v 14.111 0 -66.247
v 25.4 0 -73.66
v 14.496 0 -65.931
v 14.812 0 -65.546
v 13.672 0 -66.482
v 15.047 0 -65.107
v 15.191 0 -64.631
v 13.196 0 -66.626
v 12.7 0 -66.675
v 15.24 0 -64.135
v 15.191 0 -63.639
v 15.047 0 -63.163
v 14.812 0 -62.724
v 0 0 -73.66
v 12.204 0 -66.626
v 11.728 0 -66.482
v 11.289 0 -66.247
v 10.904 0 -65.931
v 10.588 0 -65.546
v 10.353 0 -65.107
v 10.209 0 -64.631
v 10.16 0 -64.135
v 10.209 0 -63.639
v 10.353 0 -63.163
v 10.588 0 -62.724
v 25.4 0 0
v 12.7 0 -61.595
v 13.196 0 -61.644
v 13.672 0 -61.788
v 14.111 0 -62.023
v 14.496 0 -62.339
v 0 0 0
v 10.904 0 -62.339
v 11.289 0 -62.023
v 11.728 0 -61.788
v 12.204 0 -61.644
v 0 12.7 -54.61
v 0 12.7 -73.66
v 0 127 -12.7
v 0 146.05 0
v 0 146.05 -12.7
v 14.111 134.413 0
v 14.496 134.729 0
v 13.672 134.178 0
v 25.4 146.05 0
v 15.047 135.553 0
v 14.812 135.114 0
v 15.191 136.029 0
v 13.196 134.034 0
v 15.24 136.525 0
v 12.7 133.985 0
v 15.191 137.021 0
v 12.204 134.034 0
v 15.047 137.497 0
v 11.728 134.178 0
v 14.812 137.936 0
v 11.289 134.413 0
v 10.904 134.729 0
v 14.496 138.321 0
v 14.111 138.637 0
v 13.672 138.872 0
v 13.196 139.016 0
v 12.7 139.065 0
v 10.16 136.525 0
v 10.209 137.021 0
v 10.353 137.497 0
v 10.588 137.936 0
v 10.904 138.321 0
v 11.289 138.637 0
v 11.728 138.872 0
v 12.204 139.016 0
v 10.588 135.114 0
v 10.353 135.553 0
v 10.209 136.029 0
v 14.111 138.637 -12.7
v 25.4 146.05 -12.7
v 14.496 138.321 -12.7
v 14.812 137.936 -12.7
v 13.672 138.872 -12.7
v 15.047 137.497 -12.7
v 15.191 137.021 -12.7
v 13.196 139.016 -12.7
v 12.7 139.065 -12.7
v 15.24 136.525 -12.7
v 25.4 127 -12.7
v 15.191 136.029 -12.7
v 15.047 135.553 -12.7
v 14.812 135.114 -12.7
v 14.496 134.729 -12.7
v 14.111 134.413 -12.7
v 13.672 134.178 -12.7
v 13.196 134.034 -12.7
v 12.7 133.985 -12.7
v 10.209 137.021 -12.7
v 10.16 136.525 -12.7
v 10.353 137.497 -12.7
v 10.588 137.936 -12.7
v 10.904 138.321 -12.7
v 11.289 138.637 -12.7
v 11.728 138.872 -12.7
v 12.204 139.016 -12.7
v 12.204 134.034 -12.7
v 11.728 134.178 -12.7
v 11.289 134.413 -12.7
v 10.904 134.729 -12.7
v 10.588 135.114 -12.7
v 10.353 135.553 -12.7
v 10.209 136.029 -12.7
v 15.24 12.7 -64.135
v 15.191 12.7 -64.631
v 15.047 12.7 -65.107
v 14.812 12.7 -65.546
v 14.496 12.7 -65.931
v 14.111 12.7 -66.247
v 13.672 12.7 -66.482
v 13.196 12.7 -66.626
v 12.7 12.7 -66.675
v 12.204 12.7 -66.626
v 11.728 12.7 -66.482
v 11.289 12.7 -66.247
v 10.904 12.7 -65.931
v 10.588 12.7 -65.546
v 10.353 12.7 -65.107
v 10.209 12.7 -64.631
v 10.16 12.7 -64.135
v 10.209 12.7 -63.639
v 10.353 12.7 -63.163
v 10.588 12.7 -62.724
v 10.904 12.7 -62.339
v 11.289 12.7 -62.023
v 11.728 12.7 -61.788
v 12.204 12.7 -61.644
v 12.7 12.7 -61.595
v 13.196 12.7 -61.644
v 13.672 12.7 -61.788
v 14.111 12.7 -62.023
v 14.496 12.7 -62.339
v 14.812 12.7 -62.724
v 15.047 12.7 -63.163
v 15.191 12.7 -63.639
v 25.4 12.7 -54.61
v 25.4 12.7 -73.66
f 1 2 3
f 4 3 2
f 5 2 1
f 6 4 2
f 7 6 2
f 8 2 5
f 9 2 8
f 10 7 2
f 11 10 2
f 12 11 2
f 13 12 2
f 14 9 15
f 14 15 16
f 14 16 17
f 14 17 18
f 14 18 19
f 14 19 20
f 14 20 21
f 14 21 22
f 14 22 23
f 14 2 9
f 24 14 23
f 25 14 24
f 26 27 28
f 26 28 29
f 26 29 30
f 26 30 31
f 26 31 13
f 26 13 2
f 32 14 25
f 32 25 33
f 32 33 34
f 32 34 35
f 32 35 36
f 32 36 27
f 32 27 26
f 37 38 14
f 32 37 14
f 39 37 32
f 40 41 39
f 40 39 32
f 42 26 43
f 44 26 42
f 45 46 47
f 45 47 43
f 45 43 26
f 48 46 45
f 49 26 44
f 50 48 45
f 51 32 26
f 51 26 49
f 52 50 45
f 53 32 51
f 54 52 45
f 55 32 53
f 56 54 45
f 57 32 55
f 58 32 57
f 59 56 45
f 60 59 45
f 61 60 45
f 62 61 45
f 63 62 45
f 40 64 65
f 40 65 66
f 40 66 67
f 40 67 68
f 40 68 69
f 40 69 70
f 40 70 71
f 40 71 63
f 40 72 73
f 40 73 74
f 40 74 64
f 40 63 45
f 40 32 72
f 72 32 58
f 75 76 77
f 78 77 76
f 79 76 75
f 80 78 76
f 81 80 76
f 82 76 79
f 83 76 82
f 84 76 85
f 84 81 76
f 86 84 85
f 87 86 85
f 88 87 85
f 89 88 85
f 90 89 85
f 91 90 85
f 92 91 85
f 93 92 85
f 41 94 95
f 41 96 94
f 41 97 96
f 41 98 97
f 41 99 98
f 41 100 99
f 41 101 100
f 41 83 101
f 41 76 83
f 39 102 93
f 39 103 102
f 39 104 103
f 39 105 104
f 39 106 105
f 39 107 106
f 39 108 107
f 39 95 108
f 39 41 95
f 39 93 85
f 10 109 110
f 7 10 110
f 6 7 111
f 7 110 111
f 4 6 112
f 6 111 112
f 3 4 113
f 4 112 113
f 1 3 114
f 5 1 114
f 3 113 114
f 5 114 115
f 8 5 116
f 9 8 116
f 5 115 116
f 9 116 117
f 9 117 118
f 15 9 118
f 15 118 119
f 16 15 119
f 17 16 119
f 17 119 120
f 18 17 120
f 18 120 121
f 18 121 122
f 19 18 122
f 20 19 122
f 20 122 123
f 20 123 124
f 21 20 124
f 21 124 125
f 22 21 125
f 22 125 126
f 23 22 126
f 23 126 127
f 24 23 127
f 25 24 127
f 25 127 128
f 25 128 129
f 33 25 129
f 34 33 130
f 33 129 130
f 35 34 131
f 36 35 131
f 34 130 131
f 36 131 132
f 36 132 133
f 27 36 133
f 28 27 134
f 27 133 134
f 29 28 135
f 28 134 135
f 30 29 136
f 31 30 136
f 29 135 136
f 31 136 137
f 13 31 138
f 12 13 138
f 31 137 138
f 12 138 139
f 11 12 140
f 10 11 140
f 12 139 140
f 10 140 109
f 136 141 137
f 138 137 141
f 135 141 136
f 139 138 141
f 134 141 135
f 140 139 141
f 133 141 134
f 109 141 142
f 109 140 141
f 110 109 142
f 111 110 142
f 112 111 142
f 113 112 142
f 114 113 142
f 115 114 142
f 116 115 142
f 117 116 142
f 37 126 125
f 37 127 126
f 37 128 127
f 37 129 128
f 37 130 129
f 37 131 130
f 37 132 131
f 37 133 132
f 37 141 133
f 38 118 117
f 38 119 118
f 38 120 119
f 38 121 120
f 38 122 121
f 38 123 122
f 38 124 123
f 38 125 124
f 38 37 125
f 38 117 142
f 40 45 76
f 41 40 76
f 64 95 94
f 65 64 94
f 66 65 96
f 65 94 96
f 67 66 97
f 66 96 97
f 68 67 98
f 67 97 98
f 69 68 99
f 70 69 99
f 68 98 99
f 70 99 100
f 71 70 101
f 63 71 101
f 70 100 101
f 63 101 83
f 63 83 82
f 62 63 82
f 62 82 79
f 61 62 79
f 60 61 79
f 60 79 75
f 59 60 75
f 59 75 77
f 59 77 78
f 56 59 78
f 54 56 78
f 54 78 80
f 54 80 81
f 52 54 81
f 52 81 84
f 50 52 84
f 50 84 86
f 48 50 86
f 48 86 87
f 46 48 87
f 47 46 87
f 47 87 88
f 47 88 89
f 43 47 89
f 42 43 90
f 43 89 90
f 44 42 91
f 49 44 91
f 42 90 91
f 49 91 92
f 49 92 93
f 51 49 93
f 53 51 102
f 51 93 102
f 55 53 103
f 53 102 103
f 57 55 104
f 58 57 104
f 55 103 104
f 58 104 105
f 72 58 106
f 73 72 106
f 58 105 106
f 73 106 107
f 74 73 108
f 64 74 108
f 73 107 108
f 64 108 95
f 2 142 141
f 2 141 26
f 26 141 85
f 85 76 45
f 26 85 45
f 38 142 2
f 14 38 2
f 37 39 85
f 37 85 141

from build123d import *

# Parameters (mm, degrees)
BOSS_EXTRUDE1_DEPTH = 25.4
SKETCH2_R           = 2.54
CUT_EXTRUDE1_DEPTH  = 13.7
SKETCH3_R           = 2.54
CUT_EXTRUDE2_DEPTH  = 13.7


with BuildPart() as part:
    # Sketch1 → Boss-Extrude1 (new body)
    with BuildSketch(Plane(origin=(0, 0, 0), x_dir=(0, 0, -1), z_dir=(1, 0, 0))):
        Polygon((0, 0), (0, 146.05), (12.7, 146.05), (12.7, 127), (54.61, 12.7), (73.66, 12.7), (73.66, 0), align=None)
    extrude(amount=BOSS_EXTRUDE1_DEPTH)

    # Sketch2 → Cut-Extrude1 (cut, through all)
    with BuildSketch(Plane(origin=(0, 0, -12.7), x_dir=(-1, 0, 0), z_dir=(0, 0, -1))):
        with Locations((-12.7, 136.525)):
            Circle(SKETCH2_R)
    extrude(amount=-CUT_EXTRUDE1_DEPTH, mode=Mode.SUBTRACT)

    # Sketch3 → Cut-Extrude2 (cut, through all)
    with BuildSketch(Plane(origin=(0, 12.7, 0), x_dir=(1, 0, 0), z_dir=(0, 1, 0))):
        with Locations((12.7, 64.135)):
            Circle(SKETCH3_R)
    extrude(amount=-CUT_EXTRUDE2_DEPTH, mode=Mode.SUBTRACT)


solid = part.part
